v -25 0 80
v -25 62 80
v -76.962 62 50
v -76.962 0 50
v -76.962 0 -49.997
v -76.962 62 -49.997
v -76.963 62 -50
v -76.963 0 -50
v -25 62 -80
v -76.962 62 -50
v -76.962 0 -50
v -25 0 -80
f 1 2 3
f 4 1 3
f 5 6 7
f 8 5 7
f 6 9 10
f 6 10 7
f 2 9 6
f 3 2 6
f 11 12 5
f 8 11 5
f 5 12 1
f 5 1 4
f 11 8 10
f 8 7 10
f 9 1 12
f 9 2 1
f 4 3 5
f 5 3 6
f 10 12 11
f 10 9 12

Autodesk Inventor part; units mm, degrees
ref_plane "YZ Plane" through (0, 0, 0) normal (1, 0, 0) x (0, 1, 0)
ref_plane "XZ Plane" through (0, 0, 0) normal (0, 1, 0) x (-1, 0, 0)
ref_plane "XY Plane" through (0, 0, 0) normal (0, 0, 1) x (1, 0, 0)
sketch "Sketch1" plane through (0, 0, 0) normal (0, 1, 0) x (-1, 0, 0)
  line L0 (25, 100) -> (-25, 100)
  line L1 (-25, 100) -> (-25, -100)
  line L2 (-25, -100) -> (25, -100)
  line L3 (25, -100) -> (25, 100)
  line L4 (25, 100) -> (-25, -100) construction
  line L5 (-25, 100) -> (25, -100) construction
  point P0 (0, 0)
  dimension "d0" = 50
  dimension "d1" = 200
extrude "Extrusion1" add sketch "Sketch1" along normal blind 62
sketch "Sketch2" plane through (-25, 0, 100) normal (0, 0, 1) x (1, 0, 0)
  line L0 (50, 62) -> (0, 62) projected
  line L1 (50, 62) -> (90, 62)
  line L2 (90, 62) -> (90, 42)
  line L3 (90, 42) -> (53.2289, 0)
  line L4 (53.2289, 0) -> (50, 0)
  line L5 (50, 62) -> (50, 0)
  point P0 (25, 0)
  dimension "d4" = 40
  dimension "d5" = 20
  dimension "d6" = 90
extrude "Extrusion2" add sketch "Sketch2" against normal up to surface (200 mm away)
sketch "Sketch3" plane through (0, 62, 0) normal (0, 1, 0) x (1, 0, 0)
  line L0 (-25, 100) -> (-25, -100) projected
  line L1 (-25, -100) -> (-25, 100)
  line L2 (-25, 100) -> (-25, 80)
  line L3 (-25, 80) -> (-76.9615, 50)
  line L4 (-25, -100) -> (-25, -80)
  line L5 (-25, -80) -> (-76.9615, -50)
  line L6 (-76.9615, -50) -> (-76.9615, 50)
  circle A0 centre (-76.9615, 0) radius 49.9974
  circle A1 centre (-126.9564, -0.5064) radius 49.9974
  line L7 (-76.9615, -50) -> (-126.45, -50.5013)
  line L8 (-127.4628, 49.4885) -> (-76.9615, 50)
  point P0 (0, 0)
  point P1 (-76.9615, 49.9974)
  point P2 (-77.4679, 49.9949)
  point P3 (-76.9615, -1.0128)
  dimension "d9" = 20
  dimension "d10" = 60
  dimension "d11" = 120
  dimension "d12" = 20
  dimension "d13" = 60
  dimension "d14" = 120
extrude "Extrusion3" add sketch "Sketch3" against normal blind 62
sketch "Sketch4" plane through (0, 62, 0) normal (0, 1, 0) x (1, 0, 0)
  line L0 (-25, -100) -> (28.2289, -100) projected
  line L1 (-25, 100) -> (-25, 80) projected
  line L2 (-25, -100) -> (-25, 100)
  line L3 (-25, 100) -> (29.4775, 197.567)
  line L4 (29.4775, 197.567) -> (135.6867, 127.811)
  line L5 (135.6867, 127.811) -> (135.6867, -104.409)
  line L6 (135.6867, -104.409) -> (110.0345, -245.7212)
  line L7 (110.0345, -245.7212) -> (-5.1754, -156.6135)
  line L8 (-5.1754, -156.6135) -> (-25, -100)
  line L9 (-76.9615, -50) -> (-76.9615, 49.9974)
  line L10 (-76.9615, 49.9974) -> (-143.8651, 145.0549)
  line L11 (-143.8651, 145.0549) -> (-248.9816, -0.0013)
  line L12 (-248.9816, -0.0013) -> (-240.1494, -166.1828)
  line L13 (-240.1494, -166.1828) -> (-110.4133, -169.4443)
  line L14 (-110.4133, -169.4443) -> (-76.9615, -50)
  point P0 (0, 0)
extrude "Extrusion4" cut sketch "Sketch4" against normal blind 62 contours L14 L13 L12 L11 L10 L9
extrude "Extrusion5" cut sketch "Sketch4" against normal blind 62 contours L3 L4 L5 L6 L7 L8 L2 L1
properties part number "Piece2" material "Stainless Steel"
